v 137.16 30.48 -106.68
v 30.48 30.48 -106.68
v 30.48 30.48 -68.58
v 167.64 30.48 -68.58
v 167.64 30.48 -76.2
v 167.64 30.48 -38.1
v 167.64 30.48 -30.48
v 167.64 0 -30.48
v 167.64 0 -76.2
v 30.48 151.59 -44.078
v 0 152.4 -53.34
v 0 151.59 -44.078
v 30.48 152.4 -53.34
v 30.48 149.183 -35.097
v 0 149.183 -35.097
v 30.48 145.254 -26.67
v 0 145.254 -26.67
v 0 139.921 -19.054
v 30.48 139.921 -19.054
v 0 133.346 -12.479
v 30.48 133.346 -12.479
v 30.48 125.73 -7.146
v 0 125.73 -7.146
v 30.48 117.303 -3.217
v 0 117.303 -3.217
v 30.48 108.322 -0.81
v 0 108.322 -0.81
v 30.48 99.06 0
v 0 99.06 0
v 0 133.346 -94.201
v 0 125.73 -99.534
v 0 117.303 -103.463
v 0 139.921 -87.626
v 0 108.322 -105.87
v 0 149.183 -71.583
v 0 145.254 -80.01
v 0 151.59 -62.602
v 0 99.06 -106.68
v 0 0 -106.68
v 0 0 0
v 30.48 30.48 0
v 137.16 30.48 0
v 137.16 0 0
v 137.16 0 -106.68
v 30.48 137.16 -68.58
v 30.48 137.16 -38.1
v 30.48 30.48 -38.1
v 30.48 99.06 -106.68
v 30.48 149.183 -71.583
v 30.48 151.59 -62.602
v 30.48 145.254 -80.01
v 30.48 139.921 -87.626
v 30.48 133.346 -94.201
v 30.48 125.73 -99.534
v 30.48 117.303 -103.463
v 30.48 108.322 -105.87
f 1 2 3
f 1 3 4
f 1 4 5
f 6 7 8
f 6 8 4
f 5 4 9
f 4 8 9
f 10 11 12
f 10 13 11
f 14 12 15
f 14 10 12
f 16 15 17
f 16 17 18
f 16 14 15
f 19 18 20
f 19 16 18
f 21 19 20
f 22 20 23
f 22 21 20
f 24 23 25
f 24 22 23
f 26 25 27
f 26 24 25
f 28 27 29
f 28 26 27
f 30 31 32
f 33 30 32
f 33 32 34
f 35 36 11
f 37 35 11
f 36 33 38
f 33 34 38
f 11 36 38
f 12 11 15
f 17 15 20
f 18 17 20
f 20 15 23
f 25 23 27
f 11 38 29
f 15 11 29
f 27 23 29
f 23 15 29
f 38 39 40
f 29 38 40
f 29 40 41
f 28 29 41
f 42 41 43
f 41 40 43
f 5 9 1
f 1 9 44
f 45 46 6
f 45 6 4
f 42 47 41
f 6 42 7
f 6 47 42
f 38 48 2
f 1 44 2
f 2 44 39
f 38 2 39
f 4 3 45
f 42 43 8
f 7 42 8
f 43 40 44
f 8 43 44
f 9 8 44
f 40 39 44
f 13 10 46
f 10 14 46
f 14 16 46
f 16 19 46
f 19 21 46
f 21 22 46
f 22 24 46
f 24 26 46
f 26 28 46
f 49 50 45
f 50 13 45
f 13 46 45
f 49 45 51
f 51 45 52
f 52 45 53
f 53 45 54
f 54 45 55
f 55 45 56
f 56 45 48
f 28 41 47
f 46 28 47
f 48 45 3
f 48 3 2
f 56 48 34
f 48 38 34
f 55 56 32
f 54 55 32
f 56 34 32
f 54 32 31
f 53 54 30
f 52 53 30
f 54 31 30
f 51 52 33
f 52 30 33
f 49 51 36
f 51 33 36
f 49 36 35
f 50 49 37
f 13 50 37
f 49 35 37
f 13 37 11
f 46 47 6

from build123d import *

# Parameters (mm, degrees)
BOSS_EXTRUDE1_DEPTH = 30.48
BOSS_EXTRUDE2_DEPTH = 121.92
SKETCH2_3_W         = 137.16
SKETCH2_3_H         = 30.48
BOSS_EXTRUDE3_DEPTH = 106.68
FILLET1_R           = 53.34
CHAMFER1_SIZE2      = 137.16
CHAMFER1_SIZE       = 106.68


with BuildPart() as part:
    # Sketch1 → Boss-Extrude1 (new body)
    with BuildSketch(Plane(origin=(0, 0, 0), x_dir=(1, 0, 0), z_dir=(0, 1, 0))):
        Polygon((0, 0), (137.16, 0), (167.64, 30.48), (167.64, 76.2), (137.16, 106.68), (0, 106.68), align=None)
    extrude(amount=BOSS_EXTRUDE1_DEPTH)

    # Sketch2 → Boss-Extrude2 (add)
    with BuildSketch(Plane(origin=(0, 30.48, 0), x_dir=(1, 0, 0), z_dir=(0, 1, 0))):
        Polygon((30.48, 106.68), (0, 106.68), (0, 0), (30.48, 0), (30.48, 38.1), (30.48, 68.58), align=None)
    extrude(amount=BOSS_EXTRUDE2_DEPTH)

    # Sketch2<3> → Boss-Extrude3 (add)
    with BuildSketch(Plane(origin=(0, 30.48, 0), x_dir=(1, 0, 0), z_dir=(0, 1, 0))):
        with Locations((99.06, 53.34)):
            Rectangle(SKETCH2_3_W, SKETCH2_3_H)
    extrude(amount=BOSS_EXTRUDE3_DEPTH)

    # Fillet1
    fillet1_edges = [part.edges().sort_by_distance(p)[0] for p in [
        (15.24, 152.4, 0),
        (15.24, 152.4, -106.68),
    ]]
    fillet(fillet1_edges, radius=FILLET1_R - 0.0001)  # a hair under: the kernel refuses the full size

    # Chamfer1
    chamfer1_edges = [part.edges().sort_by_distance(p)[0] for p in [
        (167.64, 137.16, -53.34),
    ]]
    chamfer1_side = [part.faces().sort_by_distance(p)[0] for p in [
        (167.64, 135.0264, -53.34),
    ]]
    chamfer(chamfer1_edges, length=CHAMFER1_SIZE - 0.0001, length2=CHAMFER1_SIZE2 - 0.0001, reference=chamfer1_side[0])  # a hair under: the kernel refuses the full size


solid = part.part
